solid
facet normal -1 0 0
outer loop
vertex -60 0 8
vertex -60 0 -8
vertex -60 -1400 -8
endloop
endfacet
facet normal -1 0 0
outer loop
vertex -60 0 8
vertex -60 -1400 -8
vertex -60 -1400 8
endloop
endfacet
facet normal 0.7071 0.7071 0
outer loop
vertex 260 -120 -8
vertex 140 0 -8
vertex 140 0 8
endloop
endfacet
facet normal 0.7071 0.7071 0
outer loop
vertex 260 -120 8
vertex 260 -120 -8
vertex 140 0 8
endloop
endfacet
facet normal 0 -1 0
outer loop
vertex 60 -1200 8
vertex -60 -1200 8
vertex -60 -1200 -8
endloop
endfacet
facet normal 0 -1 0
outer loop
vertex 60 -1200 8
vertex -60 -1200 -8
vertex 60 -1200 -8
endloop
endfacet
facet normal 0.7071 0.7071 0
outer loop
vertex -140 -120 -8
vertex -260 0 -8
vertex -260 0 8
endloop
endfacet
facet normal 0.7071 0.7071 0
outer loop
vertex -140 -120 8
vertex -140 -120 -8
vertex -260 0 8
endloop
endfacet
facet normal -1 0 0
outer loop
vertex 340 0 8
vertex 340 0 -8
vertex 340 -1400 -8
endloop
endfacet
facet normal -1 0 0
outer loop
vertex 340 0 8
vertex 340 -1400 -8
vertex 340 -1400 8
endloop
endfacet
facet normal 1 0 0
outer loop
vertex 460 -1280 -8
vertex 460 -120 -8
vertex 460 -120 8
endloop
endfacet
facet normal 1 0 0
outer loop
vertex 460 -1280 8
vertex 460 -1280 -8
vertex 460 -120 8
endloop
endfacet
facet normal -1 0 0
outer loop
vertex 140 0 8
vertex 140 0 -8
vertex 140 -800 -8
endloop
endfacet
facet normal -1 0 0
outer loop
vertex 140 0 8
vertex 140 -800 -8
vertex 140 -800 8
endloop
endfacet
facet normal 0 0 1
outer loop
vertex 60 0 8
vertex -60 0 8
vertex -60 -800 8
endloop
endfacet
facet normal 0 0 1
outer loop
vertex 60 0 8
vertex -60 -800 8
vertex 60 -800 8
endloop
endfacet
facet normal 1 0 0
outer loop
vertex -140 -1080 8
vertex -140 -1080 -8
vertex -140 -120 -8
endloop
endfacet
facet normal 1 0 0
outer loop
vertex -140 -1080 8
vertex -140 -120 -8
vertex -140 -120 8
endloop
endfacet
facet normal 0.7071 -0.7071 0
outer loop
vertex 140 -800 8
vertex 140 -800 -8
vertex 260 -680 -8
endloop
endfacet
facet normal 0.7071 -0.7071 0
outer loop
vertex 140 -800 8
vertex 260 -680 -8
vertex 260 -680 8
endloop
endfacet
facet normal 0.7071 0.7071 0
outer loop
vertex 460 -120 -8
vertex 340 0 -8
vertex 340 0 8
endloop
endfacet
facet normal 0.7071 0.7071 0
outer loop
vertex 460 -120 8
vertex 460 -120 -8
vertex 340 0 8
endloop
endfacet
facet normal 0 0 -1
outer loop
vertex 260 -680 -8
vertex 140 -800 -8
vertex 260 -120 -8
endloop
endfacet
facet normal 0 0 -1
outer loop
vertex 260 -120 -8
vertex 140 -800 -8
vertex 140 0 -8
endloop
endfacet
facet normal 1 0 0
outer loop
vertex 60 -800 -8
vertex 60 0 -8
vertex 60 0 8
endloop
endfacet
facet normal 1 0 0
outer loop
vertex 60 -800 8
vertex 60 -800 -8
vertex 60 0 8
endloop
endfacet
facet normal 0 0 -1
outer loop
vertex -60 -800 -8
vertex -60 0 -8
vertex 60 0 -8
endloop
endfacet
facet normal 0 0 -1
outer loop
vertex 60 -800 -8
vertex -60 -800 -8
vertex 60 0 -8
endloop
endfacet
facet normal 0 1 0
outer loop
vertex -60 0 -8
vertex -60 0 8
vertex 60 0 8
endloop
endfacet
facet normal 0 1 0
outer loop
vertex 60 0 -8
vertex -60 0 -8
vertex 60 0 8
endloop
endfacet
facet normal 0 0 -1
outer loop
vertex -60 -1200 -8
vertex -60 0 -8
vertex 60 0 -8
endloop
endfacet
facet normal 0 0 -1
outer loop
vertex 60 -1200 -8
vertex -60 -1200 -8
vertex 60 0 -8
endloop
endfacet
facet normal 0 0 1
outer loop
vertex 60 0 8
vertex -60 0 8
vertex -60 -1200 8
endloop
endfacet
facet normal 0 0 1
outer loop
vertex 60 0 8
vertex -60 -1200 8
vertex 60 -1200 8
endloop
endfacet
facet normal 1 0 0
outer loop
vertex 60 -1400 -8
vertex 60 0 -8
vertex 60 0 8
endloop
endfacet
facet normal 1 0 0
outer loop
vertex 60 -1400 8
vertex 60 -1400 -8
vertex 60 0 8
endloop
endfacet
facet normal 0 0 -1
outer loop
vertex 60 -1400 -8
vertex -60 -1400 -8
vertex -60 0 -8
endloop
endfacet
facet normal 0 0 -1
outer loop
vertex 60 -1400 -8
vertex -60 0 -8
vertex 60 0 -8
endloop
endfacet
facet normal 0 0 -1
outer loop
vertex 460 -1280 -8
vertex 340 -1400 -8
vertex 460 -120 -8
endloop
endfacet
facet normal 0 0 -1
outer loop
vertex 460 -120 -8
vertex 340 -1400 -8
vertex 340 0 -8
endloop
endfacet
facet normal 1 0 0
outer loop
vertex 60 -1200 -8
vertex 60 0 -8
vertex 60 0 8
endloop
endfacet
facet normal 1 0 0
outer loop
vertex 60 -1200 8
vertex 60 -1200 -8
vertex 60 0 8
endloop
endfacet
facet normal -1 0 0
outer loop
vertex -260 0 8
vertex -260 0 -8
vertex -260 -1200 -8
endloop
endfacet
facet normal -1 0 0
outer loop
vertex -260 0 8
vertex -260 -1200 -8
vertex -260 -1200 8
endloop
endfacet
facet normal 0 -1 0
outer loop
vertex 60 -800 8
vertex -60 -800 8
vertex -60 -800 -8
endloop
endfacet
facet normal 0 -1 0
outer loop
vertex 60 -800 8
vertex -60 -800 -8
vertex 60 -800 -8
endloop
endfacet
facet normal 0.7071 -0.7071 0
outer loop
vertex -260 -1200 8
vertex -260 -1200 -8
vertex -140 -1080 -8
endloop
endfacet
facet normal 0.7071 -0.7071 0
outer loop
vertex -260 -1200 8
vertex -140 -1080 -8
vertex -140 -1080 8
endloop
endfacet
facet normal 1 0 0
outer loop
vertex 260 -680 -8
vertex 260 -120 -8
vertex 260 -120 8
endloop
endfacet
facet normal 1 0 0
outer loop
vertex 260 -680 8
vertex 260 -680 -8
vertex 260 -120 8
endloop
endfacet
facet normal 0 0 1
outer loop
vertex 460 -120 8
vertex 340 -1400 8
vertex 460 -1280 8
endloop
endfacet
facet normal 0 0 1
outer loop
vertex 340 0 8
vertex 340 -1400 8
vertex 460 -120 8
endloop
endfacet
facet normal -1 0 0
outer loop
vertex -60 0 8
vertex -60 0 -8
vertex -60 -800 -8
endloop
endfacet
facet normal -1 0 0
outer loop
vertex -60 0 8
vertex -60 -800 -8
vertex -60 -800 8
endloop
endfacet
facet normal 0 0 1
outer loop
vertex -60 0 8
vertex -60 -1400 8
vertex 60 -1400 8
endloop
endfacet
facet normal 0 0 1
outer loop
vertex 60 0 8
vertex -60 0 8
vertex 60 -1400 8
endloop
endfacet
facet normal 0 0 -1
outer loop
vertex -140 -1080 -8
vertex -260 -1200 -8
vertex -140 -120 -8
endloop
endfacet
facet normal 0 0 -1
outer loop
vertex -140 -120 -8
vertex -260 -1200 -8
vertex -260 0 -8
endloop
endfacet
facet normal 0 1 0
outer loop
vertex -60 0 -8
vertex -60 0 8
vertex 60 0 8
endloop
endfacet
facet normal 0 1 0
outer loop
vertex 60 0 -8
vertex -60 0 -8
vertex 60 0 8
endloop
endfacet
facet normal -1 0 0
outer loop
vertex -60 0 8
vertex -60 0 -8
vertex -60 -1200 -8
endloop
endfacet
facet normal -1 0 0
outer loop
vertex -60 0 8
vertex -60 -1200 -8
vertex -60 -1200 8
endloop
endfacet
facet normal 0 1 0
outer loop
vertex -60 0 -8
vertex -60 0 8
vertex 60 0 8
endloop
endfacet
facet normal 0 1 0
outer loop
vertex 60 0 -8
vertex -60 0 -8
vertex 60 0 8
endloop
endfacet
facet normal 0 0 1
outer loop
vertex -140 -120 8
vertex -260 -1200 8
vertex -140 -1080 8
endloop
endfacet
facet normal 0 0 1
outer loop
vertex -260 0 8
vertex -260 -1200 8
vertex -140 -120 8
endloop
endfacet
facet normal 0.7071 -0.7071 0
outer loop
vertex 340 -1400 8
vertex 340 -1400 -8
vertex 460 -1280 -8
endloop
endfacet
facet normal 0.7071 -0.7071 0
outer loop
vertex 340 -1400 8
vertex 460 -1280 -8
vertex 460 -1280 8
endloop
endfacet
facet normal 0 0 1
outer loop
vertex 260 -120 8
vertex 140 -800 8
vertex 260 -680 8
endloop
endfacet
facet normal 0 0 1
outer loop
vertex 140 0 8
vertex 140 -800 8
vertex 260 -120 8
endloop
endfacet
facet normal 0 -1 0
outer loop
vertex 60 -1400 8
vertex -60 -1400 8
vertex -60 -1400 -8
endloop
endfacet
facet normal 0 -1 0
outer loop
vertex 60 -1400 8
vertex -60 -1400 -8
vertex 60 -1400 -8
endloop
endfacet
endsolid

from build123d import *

# Parameters (mm, degrees)
F0_W     = 120
F0_H     = 16
F1_DEPTH = 800
F2_DEPTH = 1200
F4_SIZE  = 119.99999
F6_SIZE  = 119.99999
F7_DEPTH = 1400
F9_SIZE  = 119.99999


# Not quite as in the source:
# - a fillet or chamfer is up to 0.001 mm smaller than in the source, because OpenCascade refuses the exact size


with BuildPart() as f1:
    # F0 (on Front) → F1 (new body)
    with BuildSketch(Plane.XZ):
        Rectangle(F0_W, F0_H)
    extrude(amount=F1_DEPTH)


with BuildPart() as f2:
    # F0 (on Front) → F2 (new body)
    with BuildSketch(Plane.XZ):
        Rectangle(F0_W, F0_H)
    extrude(amount=F2_DEPTH)


with BuildPart() as f3_1:
    # F3: copy of F1
    add(f1.part.moved(Location((200, 0, 0))))

    # F4 (size 120 in the source; OpenCascade refuses exactly that, so slightly less here)
    f4_edges = [f3_1.edges().sort_by_distance(p)[0] for p in [
        (260, -800, 0),
        (260, 0, 0),
    ]]
    chamfer(f4_edges, length=F4_SIZE)


with BuildPart() as f5_1:
    # F5: copy of F2
    add(f2.part.moved(Location((-200, 0, 0))))

    # F6 (size 120 in the source; OpenCascade refuses exactly that, so slightly less here)
    f6_edges = [f5_1.edges().sort_by_distance(p)[0] for p in [
        (-140, -1200, 0),
        (-140, 0, 0),
    ]]
    chamfer(f6_edges, length=F6_SIZE)


with BuildPart() as f7:
    # F0 (on Front) → F7 (new body)
    with BuildSketch(Plane.XZ):
        Rectangle(F0_W, F0_H)
    extrude(amount=F7_DEPTH)


with BuildPart() as f8_1:
    # F8: copy of F7
    add(f7.part.moved(Location((400, 0, 0))))

    # F9 (size 120 in the source; OpenCascade refuses exactly that, so slightly less here)
    f9_edges = [f8_1.edges().sort_by_distance(p)[0] for p in [
        (460, -1400, 0),
        (460, 0, 0),
    ]]
    chamfer(f9_edges, length=F9_SIZE)


solid = Compound([f1.part, f2.part, f3_1.part, f5_1.part, f7.part, f8_1.part])
